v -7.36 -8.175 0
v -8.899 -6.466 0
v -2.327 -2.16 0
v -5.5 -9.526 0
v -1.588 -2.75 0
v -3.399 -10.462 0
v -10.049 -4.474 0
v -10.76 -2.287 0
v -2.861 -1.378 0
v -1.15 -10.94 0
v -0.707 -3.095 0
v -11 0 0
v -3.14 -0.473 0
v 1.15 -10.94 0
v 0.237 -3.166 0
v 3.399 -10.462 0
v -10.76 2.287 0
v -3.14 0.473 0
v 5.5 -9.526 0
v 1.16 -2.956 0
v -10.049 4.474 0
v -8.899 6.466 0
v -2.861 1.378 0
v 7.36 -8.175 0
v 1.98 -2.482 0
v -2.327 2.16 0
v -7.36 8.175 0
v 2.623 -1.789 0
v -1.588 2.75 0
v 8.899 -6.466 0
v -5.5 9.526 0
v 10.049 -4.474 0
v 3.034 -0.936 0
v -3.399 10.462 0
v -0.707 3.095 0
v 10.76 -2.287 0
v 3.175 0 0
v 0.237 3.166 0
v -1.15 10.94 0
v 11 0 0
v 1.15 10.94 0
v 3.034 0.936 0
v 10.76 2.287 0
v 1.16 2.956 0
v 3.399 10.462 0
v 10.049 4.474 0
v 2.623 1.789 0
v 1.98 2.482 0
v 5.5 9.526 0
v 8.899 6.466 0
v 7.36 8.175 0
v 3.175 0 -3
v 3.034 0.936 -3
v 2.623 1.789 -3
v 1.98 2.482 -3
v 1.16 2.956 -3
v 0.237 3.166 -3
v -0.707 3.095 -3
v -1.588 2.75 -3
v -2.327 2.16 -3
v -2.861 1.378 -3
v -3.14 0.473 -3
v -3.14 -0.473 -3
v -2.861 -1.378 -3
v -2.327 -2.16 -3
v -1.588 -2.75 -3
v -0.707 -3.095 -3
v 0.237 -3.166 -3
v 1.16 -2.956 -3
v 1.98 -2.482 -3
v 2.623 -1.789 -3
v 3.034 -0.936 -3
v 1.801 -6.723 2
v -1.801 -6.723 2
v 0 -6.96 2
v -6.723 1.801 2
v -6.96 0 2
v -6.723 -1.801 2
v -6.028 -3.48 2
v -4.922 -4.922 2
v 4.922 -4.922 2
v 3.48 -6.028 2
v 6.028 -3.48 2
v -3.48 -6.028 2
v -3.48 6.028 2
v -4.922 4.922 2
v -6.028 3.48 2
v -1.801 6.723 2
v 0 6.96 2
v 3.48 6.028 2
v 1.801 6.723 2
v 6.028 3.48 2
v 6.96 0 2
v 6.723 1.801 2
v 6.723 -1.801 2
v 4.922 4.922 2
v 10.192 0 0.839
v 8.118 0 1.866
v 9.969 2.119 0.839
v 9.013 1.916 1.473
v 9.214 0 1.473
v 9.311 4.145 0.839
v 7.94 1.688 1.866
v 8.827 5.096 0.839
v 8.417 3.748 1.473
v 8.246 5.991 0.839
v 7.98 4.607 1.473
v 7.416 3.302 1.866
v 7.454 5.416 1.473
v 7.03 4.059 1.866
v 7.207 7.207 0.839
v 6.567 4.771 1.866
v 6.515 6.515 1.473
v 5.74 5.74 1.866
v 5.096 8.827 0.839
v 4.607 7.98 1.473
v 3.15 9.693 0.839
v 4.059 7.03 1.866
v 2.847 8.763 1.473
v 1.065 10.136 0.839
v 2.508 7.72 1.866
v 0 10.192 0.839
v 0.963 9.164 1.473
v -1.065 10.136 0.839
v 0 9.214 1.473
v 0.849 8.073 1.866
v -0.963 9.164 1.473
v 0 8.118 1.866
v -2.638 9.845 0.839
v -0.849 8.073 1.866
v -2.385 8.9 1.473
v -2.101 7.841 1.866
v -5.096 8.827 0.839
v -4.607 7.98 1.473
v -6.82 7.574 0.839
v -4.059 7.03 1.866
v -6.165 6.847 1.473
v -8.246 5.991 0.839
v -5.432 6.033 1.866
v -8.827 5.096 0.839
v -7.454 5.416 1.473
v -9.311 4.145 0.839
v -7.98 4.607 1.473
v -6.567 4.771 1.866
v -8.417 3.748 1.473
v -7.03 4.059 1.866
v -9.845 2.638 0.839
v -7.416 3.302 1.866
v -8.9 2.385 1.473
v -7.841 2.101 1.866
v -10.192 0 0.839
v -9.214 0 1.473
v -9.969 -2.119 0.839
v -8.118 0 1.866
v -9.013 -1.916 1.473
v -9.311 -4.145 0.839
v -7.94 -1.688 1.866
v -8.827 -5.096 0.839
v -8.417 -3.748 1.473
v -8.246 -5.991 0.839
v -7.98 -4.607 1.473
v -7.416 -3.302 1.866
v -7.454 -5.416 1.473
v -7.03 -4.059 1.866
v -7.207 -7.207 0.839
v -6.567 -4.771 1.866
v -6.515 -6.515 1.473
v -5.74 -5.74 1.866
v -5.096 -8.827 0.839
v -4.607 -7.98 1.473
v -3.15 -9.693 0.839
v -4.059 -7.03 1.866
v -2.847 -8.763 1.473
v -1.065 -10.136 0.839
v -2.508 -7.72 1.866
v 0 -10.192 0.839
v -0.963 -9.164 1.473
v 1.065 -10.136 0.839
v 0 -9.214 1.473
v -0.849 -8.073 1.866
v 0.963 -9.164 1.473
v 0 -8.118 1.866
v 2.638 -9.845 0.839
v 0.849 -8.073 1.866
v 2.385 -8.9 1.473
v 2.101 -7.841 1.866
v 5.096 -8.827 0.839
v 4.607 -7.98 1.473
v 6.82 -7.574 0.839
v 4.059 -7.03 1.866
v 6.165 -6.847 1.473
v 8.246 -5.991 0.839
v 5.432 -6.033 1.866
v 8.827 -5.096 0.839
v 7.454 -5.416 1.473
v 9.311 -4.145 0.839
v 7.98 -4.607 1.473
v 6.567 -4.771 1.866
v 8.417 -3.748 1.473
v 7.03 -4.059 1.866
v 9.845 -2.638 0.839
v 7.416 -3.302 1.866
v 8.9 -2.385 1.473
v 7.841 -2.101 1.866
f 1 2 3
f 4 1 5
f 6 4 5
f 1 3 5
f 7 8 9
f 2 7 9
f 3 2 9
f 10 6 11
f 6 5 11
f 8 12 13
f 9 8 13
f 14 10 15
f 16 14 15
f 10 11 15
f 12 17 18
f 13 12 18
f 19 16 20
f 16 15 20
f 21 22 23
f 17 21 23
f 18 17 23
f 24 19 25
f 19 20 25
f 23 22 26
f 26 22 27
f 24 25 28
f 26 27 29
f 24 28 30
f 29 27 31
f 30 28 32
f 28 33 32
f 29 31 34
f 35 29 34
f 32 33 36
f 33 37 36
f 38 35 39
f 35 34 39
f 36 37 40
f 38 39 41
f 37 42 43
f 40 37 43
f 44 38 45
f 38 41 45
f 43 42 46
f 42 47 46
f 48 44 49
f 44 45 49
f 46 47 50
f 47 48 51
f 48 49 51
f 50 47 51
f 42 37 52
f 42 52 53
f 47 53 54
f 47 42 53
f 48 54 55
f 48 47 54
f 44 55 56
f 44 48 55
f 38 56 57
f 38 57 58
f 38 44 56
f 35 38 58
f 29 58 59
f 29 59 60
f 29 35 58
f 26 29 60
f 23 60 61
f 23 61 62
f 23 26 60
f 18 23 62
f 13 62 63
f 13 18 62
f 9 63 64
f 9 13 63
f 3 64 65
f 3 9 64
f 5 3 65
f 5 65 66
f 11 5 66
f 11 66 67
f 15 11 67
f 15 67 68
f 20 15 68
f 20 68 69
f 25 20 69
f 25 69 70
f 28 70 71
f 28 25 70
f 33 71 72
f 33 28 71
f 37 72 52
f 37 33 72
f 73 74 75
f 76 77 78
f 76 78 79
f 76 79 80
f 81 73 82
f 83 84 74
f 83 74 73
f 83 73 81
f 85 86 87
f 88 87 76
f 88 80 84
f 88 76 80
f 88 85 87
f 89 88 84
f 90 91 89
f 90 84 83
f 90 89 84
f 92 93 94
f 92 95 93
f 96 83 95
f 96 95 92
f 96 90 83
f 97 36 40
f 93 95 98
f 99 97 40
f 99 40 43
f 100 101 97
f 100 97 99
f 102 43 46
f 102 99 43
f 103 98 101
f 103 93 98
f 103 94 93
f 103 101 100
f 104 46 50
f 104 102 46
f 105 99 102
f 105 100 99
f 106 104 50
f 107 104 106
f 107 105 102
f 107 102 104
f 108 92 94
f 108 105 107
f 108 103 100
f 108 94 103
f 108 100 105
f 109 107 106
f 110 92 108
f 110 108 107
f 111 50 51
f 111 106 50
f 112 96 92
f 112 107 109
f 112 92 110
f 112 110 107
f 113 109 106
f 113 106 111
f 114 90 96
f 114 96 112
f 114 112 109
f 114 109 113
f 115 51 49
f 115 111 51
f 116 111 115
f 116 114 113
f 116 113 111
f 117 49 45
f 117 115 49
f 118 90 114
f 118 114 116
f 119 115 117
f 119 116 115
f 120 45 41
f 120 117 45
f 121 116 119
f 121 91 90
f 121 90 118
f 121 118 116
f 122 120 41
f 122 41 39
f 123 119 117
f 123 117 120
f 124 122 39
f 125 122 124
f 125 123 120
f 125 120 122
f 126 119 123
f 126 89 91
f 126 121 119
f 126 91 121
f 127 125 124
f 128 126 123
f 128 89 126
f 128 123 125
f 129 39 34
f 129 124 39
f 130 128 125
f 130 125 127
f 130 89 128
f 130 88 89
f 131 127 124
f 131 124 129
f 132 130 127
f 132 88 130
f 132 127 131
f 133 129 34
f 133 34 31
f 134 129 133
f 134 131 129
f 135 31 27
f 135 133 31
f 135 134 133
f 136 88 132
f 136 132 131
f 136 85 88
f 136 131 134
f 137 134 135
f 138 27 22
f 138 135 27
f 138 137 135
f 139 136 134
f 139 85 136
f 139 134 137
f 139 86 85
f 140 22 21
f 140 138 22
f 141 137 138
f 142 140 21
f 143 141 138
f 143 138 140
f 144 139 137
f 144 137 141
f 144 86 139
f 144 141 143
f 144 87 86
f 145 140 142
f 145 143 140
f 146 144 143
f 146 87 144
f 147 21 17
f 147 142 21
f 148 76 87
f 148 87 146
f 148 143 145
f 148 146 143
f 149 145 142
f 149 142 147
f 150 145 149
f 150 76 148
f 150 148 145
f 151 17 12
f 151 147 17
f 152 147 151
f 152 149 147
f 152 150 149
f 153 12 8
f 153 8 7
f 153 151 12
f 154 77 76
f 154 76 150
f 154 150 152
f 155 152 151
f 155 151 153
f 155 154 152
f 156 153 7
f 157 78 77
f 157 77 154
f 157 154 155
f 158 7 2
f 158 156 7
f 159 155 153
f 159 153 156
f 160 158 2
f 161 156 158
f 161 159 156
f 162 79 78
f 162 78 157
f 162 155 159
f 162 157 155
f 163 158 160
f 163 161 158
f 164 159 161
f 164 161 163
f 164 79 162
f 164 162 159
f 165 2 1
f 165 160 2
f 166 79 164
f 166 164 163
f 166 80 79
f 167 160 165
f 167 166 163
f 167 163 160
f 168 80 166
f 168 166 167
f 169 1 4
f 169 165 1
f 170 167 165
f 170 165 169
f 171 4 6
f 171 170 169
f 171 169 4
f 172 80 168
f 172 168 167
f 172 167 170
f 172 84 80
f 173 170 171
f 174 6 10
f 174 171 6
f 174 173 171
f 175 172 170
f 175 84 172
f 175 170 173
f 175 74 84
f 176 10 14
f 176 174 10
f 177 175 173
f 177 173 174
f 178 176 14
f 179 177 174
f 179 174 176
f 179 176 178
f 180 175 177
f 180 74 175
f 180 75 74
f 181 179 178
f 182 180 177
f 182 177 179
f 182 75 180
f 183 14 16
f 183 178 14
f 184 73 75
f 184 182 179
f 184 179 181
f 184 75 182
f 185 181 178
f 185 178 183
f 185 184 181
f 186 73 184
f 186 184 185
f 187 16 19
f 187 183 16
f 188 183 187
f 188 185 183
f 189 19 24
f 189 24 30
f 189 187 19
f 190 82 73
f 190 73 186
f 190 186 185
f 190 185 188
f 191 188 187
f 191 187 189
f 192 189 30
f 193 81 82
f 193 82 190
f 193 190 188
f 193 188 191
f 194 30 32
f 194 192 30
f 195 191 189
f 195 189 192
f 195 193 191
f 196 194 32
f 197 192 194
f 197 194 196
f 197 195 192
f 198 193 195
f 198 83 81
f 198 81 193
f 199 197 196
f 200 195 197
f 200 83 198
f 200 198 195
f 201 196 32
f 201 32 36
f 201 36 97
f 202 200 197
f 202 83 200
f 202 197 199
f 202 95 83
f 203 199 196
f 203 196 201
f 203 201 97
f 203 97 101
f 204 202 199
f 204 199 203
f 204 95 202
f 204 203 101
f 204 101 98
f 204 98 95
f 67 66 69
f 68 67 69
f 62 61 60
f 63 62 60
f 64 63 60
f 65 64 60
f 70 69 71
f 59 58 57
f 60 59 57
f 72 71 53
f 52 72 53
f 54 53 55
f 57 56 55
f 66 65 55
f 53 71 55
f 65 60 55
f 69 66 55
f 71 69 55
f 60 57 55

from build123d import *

# Parameters (mm, degrees)
F0_R     = 11
F2_DEPTH = 2
F1_R     = 3.175
F3_DEPTH = 3


# Not quite as in the source:
# - a fillet or chamfer that OpenCascade refuses, or shapes differently, is made with other operations: its cross-section is extruded or revolved along the edge and cut away or added


with BuildPart() as f2:
    # F0 (on Top) → F2 (new body)
    with BuildSketch(Plane.XY):
        Circle(F0_R)
    extrude(amount=F2_DEPTH)

    # F1 (on Top) → F3 (join)
    with BuildSketch(Plane.XY):
        Circle(F1_R)
    extrude(amount=-F3_DEPTH)

    # F4: fillet of radius 5.08 on 1 edges, made by hand

    # F4_s1 → F4_t2 (revolve, cut)
    with BuildSketch(Plane.XZ):
        with BuildLine():
            ThreePointArc((11, 0), (9.2140835586, 1.4726256161), (6.9601980247, 2))
            Line((6.9601980247, 2), (11, 2))
            Line((11, 2), (11, 0))
        make_face()
    revolve(axis=Axis((0, 0, 2), (0, 0, 1)), mode=Mode.SUBTRACT)


solid = f2.part
